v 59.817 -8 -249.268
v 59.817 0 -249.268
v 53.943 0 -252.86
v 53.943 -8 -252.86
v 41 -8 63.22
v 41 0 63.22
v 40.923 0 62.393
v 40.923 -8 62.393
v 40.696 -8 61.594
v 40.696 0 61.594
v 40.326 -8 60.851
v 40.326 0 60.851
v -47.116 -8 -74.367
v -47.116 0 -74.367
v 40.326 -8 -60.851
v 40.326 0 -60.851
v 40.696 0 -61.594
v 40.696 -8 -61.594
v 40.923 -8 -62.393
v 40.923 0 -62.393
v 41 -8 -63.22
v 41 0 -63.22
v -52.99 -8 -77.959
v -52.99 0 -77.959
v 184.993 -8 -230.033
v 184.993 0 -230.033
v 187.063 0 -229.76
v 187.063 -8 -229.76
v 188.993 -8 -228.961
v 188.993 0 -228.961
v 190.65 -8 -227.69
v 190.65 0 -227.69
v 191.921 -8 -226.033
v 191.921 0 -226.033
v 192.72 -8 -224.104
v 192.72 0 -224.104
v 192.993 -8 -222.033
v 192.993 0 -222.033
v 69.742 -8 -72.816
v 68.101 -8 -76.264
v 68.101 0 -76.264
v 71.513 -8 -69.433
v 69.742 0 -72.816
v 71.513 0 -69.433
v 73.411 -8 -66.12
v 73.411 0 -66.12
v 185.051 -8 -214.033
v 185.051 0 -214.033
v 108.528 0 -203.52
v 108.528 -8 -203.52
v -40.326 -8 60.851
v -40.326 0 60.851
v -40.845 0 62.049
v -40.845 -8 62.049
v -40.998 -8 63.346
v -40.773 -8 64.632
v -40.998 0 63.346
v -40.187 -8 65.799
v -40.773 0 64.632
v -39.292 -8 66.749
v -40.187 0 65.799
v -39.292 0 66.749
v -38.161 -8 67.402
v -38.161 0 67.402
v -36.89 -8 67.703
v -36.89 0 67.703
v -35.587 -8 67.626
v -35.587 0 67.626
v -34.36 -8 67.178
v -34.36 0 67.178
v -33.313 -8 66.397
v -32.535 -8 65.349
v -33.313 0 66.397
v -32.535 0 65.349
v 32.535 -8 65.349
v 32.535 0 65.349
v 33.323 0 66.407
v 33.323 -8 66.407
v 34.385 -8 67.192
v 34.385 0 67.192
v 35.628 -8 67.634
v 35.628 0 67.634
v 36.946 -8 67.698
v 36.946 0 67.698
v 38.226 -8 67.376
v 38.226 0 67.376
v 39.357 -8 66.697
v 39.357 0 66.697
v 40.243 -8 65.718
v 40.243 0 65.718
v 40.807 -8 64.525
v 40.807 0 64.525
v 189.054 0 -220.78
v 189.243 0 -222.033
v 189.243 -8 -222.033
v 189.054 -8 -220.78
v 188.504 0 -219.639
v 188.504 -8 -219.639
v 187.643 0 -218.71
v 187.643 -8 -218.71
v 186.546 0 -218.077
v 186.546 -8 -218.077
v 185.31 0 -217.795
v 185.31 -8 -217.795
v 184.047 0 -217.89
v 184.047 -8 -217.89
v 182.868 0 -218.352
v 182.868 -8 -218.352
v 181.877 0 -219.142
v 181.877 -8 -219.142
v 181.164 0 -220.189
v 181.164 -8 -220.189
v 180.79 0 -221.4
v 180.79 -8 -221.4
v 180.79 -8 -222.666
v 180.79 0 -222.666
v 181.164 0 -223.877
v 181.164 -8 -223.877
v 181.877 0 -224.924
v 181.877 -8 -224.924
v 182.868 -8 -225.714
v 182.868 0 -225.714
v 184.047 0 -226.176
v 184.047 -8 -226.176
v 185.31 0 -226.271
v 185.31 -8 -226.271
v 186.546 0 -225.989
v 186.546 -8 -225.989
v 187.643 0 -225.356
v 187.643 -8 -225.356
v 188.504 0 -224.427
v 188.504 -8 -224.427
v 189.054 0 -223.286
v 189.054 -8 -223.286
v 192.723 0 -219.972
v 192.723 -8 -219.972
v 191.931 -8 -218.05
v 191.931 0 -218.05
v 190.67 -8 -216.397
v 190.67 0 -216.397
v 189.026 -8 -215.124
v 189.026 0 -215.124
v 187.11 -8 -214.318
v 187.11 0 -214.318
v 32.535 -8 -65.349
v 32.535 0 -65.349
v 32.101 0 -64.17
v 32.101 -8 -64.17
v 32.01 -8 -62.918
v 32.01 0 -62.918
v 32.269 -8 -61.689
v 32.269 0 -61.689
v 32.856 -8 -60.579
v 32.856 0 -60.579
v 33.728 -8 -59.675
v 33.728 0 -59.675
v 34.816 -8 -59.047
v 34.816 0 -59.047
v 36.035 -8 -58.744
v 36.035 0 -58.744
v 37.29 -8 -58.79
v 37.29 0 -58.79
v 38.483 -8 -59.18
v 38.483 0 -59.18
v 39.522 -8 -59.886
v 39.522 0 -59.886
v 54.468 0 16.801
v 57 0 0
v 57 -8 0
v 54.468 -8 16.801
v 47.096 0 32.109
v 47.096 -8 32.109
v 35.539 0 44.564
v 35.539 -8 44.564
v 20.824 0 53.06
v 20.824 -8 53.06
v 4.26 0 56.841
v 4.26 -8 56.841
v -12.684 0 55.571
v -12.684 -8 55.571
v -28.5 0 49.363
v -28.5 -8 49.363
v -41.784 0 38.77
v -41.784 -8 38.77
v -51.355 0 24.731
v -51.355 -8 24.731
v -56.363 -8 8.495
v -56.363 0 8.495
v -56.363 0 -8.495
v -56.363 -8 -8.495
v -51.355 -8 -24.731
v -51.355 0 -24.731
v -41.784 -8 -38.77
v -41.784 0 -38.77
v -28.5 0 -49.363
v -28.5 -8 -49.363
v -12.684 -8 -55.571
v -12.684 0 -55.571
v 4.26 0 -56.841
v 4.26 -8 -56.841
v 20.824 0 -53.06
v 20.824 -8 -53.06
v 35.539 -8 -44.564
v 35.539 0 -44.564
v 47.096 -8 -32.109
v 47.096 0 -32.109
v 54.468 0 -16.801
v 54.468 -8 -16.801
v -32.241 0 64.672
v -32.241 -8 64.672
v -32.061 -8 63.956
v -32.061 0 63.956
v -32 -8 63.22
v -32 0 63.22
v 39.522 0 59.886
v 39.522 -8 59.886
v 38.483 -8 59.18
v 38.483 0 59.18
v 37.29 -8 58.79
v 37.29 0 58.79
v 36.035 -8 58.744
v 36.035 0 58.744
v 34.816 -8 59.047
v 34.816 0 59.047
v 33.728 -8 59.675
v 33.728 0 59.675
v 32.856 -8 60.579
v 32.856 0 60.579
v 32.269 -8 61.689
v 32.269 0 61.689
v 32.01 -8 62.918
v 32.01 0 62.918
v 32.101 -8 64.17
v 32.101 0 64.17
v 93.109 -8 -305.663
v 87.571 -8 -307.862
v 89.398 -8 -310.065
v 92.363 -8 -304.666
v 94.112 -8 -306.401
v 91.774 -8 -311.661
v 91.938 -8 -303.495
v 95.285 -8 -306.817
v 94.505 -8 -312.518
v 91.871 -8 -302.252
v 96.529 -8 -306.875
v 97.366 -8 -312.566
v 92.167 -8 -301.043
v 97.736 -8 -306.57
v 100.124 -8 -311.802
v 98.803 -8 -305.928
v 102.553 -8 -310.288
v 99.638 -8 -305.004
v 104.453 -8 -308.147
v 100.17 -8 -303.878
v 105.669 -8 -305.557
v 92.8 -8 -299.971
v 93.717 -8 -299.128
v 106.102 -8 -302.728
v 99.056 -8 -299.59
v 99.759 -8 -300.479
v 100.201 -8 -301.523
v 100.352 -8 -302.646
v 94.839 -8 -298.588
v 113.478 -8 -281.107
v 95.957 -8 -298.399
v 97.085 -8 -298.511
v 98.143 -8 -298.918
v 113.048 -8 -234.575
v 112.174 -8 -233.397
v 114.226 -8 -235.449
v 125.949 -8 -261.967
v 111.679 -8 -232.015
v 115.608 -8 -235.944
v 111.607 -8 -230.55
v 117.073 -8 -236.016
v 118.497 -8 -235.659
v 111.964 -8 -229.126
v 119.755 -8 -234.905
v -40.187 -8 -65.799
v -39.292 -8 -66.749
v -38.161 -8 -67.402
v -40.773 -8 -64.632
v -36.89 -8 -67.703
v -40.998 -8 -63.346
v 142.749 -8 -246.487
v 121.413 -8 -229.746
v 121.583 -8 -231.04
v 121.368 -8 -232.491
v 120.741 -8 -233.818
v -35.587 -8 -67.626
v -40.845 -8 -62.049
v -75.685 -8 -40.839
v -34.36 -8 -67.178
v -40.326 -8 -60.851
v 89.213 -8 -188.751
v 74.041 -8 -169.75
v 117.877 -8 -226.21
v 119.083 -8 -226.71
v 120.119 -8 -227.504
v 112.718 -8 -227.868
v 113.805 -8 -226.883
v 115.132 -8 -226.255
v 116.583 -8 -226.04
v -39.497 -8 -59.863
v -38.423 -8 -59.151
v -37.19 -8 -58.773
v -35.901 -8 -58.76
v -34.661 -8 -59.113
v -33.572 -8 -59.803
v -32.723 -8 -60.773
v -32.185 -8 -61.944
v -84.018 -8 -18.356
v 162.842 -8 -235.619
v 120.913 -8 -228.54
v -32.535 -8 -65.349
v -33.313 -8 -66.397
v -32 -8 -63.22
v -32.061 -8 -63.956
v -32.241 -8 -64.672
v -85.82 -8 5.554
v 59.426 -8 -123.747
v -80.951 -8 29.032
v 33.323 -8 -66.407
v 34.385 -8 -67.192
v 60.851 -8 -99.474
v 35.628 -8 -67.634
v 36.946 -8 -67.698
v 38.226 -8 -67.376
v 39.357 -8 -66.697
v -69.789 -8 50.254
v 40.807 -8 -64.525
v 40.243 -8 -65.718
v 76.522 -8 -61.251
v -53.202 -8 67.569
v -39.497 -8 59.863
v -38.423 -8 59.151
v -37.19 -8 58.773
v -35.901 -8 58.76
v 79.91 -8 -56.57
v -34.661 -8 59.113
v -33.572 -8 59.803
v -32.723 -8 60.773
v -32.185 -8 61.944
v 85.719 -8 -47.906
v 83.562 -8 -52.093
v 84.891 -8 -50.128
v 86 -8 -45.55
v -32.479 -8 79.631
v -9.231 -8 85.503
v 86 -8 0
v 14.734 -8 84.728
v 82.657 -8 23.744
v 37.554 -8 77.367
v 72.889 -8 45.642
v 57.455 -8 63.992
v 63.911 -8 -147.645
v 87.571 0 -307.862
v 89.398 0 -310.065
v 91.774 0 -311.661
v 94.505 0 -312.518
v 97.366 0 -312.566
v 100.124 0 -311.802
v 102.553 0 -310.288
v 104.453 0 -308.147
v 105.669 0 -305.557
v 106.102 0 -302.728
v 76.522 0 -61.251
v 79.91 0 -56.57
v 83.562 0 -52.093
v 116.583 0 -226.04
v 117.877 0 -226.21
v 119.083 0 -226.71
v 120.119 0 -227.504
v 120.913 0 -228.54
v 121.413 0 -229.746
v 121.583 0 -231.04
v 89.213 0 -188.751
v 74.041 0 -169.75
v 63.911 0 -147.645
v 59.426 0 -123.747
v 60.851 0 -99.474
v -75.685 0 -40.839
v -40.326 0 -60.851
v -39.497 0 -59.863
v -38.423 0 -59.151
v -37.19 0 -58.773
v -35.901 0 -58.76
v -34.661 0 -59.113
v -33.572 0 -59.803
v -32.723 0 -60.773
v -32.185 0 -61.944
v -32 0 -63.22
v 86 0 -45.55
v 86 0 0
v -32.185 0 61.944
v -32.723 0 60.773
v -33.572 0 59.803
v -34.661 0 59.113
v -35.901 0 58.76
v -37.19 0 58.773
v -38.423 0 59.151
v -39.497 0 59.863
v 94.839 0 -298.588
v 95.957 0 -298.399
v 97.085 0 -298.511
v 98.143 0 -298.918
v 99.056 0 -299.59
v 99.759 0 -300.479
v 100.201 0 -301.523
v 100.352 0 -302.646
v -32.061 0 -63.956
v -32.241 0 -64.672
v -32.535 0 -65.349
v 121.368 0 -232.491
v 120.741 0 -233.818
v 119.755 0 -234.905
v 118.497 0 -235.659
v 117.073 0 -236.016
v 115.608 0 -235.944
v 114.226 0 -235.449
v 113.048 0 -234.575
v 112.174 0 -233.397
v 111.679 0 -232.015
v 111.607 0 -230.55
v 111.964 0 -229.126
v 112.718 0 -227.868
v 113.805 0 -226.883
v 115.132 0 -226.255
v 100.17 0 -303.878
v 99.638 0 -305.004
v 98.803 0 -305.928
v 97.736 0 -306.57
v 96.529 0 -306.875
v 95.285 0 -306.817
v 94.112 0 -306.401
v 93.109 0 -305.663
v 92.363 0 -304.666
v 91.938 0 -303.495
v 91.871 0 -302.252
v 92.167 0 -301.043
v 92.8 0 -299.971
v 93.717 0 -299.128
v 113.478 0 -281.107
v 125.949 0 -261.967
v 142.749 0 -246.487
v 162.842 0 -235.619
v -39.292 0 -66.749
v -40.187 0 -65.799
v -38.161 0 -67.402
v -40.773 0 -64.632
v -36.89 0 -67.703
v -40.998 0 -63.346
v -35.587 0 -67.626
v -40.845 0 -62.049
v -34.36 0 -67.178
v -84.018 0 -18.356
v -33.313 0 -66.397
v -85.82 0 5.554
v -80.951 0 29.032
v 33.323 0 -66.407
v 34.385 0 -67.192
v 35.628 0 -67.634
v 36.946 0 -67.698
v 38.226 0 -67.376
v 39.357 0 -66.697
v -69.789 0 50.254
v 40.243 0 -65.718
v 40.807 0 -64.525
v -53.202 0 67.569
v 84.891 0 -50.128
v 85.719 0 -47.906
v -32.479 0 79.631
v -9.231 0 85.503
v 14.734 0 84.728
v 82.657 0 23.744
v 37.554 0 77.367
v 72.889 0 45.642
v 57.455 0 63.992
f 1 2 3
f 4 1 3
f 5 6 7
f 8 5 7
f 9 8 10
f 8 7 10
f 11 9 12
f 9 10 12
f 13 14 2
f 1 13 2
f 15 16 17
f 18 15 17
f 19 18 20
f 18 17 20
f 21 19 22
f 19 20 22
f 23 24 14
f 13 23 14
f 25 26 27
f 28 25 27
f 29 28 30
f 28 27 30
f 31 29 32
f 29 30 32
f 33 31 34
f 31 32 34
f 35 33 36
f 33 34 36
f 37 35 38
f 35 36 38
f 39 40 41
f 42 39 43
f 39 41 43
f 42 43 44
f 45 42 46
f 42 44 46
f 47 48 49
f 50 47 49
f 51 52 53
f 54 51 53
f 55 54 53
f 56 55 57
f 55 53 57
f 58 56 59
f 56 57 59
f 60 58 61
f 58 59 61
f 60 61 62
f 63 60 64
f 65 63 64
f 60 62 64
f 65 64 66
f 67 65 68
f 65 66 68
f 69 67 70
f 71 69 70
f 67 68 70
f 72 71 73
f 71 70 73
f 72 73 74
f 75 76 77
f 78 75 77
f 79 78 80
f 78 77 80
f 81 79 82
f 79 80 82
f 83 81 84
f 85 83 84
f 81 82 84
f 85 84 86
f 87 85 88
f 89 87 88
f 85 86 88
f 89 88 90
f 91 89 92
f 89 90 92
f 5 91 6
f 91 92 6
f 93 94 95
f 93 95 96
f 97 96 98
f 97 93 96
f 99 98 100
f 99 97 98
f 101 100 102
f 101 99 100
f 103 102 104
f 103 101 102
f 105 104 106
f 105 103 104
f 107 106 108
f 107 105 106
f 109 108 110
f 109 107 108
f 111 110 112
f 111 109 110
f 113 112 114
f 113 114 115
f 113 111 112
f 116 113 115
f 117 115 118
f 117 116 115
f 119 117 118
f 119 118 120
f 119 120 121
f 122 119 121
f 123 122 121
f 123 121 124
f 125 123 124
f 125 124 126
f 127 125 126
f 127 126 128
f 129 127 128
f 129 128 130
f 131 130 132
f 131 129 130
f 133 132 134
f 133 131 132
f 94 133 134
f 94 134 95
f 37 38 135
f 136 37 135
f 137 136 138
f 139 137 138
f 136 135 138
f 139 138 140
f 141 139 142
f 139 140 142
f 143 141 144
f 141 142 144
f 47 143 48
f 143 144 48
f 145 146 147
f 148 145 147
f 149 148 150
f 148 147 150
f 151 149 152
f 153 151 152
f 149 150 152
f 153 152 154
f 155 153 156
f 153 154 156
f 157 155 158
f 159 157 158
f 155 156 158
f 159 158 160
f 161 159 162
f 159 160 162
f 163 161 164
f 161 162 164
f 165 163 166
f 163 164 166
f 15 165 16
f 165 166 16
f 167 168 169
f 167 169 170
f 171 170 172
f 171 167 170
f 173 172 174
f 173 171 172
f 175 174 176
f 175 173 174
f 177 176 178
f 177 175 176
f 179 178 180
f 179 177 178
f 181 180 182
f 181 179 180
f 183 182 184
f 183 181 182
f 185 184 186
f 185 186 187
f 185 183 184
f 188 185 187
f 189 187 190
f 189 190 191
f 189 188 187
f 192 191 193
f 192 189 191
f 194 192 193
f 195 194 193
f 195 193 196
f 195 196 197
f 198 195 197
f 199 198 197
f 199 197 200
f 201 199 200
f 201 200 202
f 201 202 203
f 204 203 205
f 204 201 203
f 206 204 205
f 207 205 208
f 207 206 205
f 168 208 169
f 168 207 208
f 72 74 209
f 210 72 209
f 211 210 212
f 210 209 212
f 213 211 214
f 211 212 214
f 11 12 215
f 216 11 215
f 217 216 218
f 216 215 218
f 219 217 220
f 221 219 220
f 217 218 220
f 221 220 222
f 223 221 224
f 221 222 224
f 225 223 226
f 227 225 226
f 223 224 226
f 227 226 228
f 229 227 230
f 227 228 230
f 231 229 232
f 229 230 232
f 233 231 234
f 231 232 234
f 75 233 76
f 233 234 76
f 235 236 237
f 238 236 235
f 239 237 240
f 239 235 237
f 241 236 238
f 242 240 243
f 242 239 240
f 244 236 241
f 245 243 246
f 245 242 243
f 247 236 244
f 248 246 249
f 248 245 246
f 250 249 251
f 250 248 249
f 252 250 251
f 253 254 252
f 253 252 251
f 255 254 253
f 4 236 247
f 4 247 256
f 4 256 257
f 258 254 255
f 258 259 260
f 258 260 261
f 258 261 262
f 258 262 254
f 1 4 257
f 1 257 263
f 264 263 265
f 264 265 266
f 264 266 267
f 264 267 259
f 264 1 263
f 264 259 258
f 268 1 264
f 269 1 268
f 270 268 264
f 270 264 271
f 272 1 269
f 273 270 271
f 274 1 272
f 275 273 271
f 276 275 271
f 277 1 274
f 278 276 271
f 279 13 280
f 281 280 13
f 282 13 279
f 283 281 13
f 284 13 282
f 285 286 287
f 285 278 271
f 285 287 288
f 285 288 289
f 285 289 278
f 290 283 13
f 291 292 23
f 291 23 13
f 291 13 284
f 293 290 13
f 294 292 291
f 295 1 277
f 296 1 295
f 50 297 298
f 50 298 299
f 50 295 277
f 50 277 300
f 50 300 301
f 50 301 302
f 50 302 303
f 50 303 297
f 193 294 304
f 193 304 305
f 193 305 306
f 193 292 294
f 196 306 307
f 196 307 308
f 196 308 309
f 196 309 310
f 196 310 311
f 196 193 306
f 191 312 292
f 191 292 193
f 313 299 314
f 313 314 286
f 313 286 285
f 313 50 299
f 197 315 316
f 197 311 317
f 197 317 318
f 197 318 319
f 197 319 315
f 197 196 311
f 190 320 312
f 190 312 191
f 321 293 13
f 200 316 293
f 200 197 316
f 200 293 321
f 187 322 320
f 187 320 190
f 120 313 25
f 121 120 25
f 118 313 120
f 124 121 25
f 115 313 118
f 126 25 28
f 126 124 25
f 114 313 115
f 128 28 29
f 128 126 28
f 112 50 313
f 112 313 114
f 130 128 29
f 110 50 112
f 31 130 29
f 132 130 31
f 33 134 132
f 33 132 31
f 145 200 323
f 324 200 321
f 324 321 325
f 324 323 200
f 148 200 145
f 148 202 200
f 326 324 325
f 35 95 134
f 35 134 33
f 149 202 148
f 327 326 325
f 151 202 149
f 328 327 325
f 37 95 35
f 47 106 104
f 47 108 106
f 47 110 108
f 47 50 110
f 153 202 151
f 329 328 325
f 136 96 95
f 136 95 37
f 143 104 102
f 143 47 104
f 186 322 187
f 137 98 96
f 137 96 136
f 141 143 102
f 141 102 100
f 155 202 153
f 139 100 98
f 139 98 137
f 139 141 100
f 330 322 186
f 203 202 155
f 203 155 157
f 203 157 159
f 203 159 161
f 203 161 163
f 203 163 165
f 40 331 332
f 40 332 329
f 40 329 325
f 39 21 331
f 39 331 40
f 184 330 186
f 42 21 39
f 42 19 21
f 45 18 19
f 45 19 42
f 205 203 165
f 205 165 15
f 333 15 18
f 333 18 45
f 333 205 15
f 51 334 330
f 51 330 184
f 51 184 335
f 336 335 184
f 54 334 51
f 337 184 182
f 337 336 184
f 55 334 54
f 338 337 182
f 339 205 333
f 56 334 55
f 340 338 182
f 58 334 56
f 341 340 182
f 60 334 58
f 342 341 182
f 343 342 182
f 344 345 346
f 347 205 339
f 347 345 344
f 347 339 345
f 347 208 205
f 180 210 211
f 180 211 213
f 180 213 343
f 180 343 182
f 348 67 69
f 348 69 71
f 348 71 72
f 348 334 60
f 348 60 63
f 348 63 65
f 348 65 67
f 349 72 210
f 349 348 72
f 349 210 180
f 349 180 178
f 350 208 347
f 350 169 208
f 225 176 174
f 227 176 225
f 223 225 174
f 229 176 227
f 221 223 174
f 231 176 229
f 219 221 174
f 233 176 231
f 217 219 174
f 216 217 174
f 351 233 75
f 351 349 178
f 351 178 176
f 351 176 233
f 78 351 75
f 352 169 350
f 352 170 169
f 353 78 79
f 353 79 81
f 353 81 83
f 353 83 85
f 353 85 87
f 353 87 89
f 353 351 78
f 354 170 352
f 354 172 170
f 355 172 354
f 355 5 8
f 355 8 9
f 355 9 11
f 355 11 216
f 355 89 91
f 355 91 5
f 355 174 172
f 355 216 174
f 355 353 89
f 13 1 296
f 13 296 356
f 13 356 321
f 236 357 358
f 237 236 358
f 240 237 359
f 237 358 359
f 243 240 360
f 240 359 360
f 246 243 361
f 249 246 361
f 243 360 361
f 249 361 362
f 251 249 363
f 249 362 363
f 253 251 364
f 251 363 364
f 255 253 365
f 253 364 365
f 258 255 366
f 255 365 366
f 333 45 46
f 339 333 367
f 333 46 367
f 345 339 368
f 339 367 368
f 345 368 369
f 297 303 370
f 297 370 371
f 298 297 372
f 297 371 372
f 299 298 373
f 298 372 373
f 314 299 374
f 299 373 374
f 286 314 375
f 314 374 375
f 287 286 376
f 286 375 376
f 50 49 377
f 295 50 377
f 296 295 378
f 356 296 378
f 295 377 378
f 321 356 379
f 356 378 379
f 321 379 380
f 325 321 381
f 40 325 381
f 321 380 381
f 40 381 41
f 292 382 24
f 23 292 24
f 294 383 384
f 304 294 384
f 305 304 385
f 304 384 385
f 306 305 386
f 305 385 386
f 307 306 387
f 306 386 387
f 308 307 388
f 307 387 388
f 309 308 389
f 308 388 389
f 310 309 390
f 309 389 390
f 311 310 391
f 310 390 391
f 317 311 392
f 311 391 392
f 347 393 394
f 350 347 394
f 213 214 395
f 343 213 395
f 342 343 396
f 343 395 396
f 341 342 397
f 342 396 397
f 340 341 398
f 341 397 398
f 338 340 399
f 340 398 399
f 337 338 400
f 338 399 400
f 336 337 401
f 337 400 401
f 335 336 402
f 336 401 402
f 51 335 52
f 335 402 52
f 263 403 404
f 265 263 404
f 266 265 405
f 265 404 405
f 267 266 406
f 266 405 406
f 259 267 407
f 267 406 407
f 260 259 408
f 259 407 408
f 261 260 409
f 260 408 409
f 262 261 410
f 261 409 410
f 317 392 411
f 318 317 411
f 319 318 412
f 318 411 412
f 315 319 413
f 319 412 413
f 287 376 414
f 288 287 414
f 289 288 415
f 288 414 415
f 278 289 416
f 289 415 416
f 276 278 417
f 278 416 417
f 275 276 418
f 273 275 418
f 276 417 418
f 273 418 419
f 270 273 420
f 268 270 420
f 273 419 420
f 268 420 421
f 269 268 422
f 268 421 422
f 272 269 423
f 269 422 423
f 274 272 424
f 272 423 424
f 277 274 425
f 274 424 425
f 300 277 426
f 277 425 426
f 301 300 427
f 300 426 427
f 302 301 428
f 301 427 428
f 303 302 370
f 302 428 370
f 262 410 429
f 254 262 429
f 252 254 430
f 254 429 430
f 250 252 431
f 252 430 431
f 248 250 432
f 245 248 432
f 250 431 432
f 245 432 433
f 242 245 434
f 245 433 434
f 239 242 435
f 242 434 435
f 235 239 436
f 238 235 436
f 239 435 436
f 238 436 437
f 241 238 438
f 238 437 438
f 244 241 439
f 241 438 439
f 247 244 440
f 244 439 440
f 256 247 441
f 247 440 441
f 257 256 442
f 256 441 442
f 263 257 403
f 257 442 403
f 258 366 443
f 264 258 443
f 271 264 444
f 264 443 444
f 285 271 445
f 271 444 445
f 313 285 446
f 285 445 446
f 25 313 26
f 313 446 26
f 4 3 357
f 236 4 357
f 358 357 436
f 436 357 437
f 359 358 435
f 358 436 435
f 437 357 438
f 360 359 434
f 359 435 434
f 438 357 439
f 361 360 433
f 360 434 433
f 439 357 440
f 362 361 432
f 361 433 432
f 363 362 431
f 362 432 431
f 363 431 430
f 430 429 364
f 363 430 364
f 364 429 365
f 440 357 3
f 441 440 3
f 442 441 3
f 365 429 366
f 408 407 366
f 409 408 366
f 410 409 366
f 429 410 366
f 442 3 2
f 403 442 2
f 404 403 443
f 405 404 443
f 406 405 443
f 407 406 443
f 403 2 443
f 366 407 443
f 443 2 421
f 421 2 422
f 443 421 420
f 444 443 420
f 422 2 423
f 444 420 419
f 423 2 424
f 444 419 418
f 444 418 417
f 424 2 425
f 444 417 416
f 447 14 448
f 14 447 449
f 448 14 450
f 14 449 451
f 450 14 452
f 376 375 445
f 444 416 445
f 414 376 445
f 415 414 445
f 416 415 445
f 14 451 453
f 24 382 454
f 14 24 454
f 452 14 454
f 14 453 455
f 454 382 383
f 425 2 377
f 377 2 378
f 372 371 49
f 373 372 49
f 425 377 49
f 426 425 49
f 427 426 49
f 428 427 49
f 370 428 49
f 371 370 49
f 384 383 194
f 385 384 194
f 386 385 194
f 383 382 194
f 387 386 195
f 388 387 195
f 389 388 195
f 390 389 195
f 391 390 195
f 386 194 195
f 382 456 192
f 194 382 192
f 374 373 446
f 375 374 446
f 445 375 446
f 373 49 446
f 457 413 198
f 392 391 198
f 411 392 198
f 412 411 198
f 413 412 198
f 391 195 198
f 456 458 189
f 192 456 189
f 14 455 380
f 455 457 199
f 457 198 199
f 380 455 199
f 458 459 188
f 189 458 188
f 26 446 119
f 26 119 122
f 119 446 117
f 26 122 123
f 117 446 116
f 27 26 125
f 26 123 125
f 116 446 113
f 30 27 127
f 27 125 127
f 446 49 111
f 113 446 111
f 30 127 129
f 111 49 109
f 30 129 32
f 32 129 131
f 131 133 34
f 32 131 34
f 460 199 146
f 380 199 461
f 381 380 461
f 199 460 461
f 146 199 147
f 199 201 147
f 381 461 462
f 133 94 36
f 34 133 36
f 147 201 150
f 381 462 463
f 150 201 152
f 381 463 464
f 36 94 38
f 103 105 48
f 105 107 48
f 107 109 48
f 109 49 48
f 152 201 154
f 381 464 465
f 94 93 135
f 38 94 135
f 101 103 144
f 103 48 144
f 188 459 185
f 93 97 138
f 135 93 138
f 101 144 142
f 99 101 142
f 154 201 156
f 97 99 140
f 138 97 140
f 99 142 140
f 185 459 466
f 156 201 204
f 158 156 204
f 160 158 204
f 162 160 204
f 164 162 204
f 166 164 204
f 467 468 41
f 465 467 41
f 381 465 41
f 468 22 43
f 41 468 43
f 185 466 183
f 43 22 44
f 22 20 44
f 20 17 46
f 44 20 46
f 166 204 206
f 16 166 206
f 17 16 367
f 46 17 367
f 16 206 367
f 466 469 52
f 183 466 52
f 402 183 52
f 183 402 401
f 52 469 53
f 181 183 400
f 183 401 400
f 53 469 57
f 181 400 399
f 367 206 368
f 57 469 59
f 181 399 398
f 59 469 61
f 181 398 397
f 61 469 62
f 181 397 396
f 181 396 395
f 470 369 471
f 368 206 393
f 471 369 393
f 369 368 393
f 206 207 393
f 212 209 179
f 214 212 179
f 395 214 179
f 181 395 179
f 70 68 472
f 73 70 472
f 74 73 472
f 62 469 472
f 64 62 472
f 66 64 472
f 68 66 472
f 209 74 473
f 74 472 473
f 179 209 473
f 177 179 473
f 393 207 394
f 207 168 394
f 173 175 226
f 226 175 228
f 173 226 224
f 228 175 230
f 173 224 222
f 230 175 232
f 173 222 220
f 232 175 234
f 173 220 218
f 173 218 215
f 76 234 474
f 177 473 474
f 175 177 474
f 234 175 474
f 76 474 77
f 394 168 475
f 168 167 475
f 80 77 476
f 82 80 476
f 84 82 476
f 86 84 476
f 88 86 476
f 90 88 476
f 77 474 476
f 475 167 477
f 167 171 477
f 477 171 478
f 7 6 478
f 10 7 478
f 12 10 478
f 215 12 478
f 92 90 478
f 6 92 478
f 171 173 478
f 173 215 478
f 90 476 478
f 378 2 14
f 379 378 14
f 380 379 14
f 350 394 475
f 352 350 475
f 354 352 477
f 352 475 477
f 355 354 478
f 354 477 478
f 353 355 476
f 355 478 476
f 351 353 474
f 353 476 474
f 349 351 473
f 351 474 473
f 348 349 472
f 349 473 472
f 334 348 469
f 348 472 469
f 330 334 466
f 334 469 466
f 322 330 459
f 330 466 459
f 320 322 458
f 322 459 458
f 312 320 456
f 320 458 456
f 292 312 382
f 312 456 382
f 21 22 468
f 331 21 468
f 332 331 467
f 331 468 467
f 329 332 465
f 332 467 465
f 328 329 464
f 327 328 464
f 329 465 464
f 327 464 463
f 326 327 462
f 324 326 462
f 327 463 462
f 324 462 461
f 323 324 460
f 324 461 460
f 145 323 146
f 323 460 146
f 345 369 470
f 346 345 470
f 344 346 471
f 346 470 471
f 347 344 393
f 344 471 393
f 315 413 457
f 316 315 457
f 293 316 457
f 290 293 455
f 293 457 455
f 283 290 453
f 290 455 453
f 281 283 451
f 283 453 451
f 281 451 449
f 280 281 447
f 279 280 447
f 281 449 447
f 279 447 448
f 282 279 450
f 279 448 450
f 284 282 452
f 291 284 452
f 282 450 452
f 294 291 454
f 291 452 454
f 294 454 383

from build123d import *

# Parameters (mm, degrees)
F0_R     = 4.25
F0_R_2   = 57
F1_DEPTH = 8


# Not quite as in the source:
# - a feature names something its author has since deleted; it is built from what else it names


with BuildPart() as f1:
    # F0 (on Front) → F1 (new body)
    with BuildSketch(Plane.XZ):
        with BuildLine():
            Line((86, -45.5504168361), (86, 0))
            ThreePointArc((86, 0), (25.52491441, -82.1247754601), (-70.8483428922, -48.7494852222))
            Line((-70.8483428922, -48.7494852222), (-52.9901534319, -77.9586575178))
            Line((-52.9901534319, -77.9586575178), (-47.1157296051, -74.3670948194))
            Line((-47.1157296051, -74.3670948194), (59.817007023, -249.2681806857))
            Line((59.817007023, -249.2681806857), (53.9425831962, -252.8597433842))
            Line((53.9425831962, -252.8597433842), (87.570656583, -307.862418303))
            ThreePointArc((87.570656583, -307.862418303), (86.7439526122, -299.1221062681), (93.1304247757, -293.0980322955))
            ThreePointArc((93.1304247757, -293.0980322955), (102.0303203377, -294.5926190657), (106.1024168691, -302.646187248))
            ThreePointArc((106.1024168691, -302.646187248), (106.1023341619, -302.6868583365), (106.1020860416, -302.7275287523))
            ThreePointArc((106.1020860416, -302.7275287523), (133.8669990345, -253.7041794438), (184.9928569387, -230.0329770139))
            ThreePointArc((184.9928569387, -230.0329770139), (176.9929095406, -222.0039661985), (185.0508781881, -214.0331874208))
            Line((185.0508781881, -214.0331874208), (108.5283892756, -203.5204235365))
            ThreePointArc((108.5283892756, -203.5204235365), (63.9114156279, -147.6449683437), (68.1014852993, -76.2644097396))
            ThreePointArc((68.1014852993, -76.2644097396), (70.6109477759, -71.1161938658), (73.4114917534, -66.1203473875))
            ThreePointArc((73.4114917534, -66.1203473875), (78.1822601822, -58.8864182021), (83.5623402825, -52.0934290975))
            ThreePointArc((83.5623402825, -52.0934290975), (85.3707897966, -49.0415912213), (86, -45.5504168361))
        make_face()
        with BuildLine():
            ThreePointArc((116.5832400171, -226.0398806244), (120.1187739231, -227.5043467184), (121.5832400171, -231.0398806244))
            ThreePointArc((121.5832400171, -231.0398806244), (113.0477061112, -234.5754145303), (116.5832400171, -226.0398806244))
        make_face(mode=Mode.SUBTRACT)
        with BuildLine():
            ThreePointArc((93.1304247757, -293.0980322955), (86.7439526122, -299.1221062681), (87.570656583, -307.862418303))
            ThreePointArc((87.570656583, -307.862418303), (98.7727093249, -312.2830715059), (106.1020860416, -302.7275287523))
            ThreePointArc((106.1020860416, -302.7275287523), (106.1023341619, -302.6868583365), (106.1024168691, -302.646187248))
            ThreePointArc((106.1024168691, -302.646187248), (102.0303203377, -294.5926190657), (93.1304247757, -293.0980322955))
        make_face()
        with BuildLine():
            ThreePointArc((100.3524168691, -302.646187248), (93.583057895, -306.0689537255), (94.8393202294, -298.5882213932))
            ThreePointArc((94.8393202294, -298.5882213932), (98.6217758433, -299.2234207705), (100.3524168691, -302.646187248))
        make_face(mode=Mode.SUBTRACT)
        with BuildLine():
            ThreePointArc((192.9928569387, -222.0329770139), (190.6701877373, -216.3966737039), (185.0508781881, -214.0331874208))
            ThreePointArc((185.0508781881, -214.0331874208), (176.9929095406, -222.0039661985), (184.9928569387, -230.0329770139))
            ThreePointArc((184.9928569387, -230.0329770139), (190.6497111882, -227.6898312634), (192.9928569387, -222.0329770139))
        make_face()
        with Locations((184.9928569387, -222.0329770139)):
            Circle(F0_R, mode=Mode.SUBTRACT)
        with BuildLine():
            ThreePointArc((-70.8483428922, -48.7494852222), (25.52491441, -82.1247754601), (86, 0))
            ThreePointArc((86, 0), (-21.0609353072, 83.3812749002), (-75.6845814881, -40.8392473605))
            Line((-75.6845814881, -40.8392473605), (-70.8483428922, -48.7494852222))
        make_face()
        with BuildLine():
            ThreePointArc((40.3259134511, 60.8508069325), (64.3148182067, 34.5341013932), (73, 0))
            ThreePointArc((73, 0), (64.3148182067, -34.5341013932), (40.3259134511, -60.8508069325))
            ThreePointArc((40.3259134511, -60.8508069325), (40.8281988477, -61.9883128671), (41, -63.2198544763))
            ThreePointArc((41, -63.2198544763), (37.5975531045, -67.5839554355), (32.5353879188, -65.3486689457))
            ThreePointArc((32.5353879188, -65.3486689457), (0, -73), (-32.5353879188, -65.3486689457))
            ThreePointArc((-32.5353879188, -65.3486689457), (-38.75, -67.1169687933), (-40.3259134511, -60.8508069325))
            ThreePointArc((-40.3259134511, -60.8508069325), (-73, 0), (-40.3259134511, 60.8508069325))
            ThreePointArc((-40.3259134511, 60.8508069325), (-38.75, 67.1169687933), (-32.5353879188, 65.3486689457))
            ThreePointArc((-32.5353879188, 65.3486689457), (0, 73), (32.5353879188, 65.3486689457))
            ThreePointArc((32.5353879188, 65.3486689457), (37.5975531045, 67.5839554355), (41, 63.2198544763))
            ThreePointArc((41, 63.2198544763), (40.8281988477, 61.9883128671), (40.3259134511, 60.8508069325))
        make_face(mode=Mode.SUBTRACT)
        with BuildLine():
            ThreePointArc((40.3259134511, -60.8508069325), (64.3148182067, -34.5341013932), (73, 0))
            ThreePointArc((73, 0), (64.3148182067, 34.5341013932), (40.3259134511, 60.8508069325))
            ThreePointArc((40.3259134511, 60.8508069325), (34.25, 59.3227401592), (32.5353879188, 65.3486689457))
            ThreePointArc((32.5353879188, 65.3486689457), (0, 73), (-32.5353879188, 65.3486689457))
            ThreePointArc((-32.5353879188, 65.3486689457), (-32.1358990407, 64.3174075808), (-32, 63.2198544763))
            ThreePointArc((-32, 63.2198544763), (-35.2684583909, 58.8916556286), (-40.3259134511, 60.8508069325))
            ThreePointArc((-40.3259134511, 60.8508069325), (-73, 0), (-40.3259134511, -60.8508069325))
            ThreePointArc((-40.3259134511, -60.8508069325), (-35.2684583909, -58.8916556286), (-32, -63.2198544763))
            ThreePointArc((-32, -63.2198544763), (-32.1358990407, -64.3174075808), (-32.5353879188, -65.3486689457))
            ThreePointArc((-32.5353879188, -65.3486689457), (0, -73), (32.5353879188, -65.3486689457))
            ThreePointArc((32.5353879188, -65.3486689457), (34.25, -59.3227401592), (40.3259134511, -60.8508069325))
        make_face()
        Circle(F0_R_2, mode=Mode.SUBTRACT)
    extrude(amount=F1_DEPTH)


solid = f1.part
